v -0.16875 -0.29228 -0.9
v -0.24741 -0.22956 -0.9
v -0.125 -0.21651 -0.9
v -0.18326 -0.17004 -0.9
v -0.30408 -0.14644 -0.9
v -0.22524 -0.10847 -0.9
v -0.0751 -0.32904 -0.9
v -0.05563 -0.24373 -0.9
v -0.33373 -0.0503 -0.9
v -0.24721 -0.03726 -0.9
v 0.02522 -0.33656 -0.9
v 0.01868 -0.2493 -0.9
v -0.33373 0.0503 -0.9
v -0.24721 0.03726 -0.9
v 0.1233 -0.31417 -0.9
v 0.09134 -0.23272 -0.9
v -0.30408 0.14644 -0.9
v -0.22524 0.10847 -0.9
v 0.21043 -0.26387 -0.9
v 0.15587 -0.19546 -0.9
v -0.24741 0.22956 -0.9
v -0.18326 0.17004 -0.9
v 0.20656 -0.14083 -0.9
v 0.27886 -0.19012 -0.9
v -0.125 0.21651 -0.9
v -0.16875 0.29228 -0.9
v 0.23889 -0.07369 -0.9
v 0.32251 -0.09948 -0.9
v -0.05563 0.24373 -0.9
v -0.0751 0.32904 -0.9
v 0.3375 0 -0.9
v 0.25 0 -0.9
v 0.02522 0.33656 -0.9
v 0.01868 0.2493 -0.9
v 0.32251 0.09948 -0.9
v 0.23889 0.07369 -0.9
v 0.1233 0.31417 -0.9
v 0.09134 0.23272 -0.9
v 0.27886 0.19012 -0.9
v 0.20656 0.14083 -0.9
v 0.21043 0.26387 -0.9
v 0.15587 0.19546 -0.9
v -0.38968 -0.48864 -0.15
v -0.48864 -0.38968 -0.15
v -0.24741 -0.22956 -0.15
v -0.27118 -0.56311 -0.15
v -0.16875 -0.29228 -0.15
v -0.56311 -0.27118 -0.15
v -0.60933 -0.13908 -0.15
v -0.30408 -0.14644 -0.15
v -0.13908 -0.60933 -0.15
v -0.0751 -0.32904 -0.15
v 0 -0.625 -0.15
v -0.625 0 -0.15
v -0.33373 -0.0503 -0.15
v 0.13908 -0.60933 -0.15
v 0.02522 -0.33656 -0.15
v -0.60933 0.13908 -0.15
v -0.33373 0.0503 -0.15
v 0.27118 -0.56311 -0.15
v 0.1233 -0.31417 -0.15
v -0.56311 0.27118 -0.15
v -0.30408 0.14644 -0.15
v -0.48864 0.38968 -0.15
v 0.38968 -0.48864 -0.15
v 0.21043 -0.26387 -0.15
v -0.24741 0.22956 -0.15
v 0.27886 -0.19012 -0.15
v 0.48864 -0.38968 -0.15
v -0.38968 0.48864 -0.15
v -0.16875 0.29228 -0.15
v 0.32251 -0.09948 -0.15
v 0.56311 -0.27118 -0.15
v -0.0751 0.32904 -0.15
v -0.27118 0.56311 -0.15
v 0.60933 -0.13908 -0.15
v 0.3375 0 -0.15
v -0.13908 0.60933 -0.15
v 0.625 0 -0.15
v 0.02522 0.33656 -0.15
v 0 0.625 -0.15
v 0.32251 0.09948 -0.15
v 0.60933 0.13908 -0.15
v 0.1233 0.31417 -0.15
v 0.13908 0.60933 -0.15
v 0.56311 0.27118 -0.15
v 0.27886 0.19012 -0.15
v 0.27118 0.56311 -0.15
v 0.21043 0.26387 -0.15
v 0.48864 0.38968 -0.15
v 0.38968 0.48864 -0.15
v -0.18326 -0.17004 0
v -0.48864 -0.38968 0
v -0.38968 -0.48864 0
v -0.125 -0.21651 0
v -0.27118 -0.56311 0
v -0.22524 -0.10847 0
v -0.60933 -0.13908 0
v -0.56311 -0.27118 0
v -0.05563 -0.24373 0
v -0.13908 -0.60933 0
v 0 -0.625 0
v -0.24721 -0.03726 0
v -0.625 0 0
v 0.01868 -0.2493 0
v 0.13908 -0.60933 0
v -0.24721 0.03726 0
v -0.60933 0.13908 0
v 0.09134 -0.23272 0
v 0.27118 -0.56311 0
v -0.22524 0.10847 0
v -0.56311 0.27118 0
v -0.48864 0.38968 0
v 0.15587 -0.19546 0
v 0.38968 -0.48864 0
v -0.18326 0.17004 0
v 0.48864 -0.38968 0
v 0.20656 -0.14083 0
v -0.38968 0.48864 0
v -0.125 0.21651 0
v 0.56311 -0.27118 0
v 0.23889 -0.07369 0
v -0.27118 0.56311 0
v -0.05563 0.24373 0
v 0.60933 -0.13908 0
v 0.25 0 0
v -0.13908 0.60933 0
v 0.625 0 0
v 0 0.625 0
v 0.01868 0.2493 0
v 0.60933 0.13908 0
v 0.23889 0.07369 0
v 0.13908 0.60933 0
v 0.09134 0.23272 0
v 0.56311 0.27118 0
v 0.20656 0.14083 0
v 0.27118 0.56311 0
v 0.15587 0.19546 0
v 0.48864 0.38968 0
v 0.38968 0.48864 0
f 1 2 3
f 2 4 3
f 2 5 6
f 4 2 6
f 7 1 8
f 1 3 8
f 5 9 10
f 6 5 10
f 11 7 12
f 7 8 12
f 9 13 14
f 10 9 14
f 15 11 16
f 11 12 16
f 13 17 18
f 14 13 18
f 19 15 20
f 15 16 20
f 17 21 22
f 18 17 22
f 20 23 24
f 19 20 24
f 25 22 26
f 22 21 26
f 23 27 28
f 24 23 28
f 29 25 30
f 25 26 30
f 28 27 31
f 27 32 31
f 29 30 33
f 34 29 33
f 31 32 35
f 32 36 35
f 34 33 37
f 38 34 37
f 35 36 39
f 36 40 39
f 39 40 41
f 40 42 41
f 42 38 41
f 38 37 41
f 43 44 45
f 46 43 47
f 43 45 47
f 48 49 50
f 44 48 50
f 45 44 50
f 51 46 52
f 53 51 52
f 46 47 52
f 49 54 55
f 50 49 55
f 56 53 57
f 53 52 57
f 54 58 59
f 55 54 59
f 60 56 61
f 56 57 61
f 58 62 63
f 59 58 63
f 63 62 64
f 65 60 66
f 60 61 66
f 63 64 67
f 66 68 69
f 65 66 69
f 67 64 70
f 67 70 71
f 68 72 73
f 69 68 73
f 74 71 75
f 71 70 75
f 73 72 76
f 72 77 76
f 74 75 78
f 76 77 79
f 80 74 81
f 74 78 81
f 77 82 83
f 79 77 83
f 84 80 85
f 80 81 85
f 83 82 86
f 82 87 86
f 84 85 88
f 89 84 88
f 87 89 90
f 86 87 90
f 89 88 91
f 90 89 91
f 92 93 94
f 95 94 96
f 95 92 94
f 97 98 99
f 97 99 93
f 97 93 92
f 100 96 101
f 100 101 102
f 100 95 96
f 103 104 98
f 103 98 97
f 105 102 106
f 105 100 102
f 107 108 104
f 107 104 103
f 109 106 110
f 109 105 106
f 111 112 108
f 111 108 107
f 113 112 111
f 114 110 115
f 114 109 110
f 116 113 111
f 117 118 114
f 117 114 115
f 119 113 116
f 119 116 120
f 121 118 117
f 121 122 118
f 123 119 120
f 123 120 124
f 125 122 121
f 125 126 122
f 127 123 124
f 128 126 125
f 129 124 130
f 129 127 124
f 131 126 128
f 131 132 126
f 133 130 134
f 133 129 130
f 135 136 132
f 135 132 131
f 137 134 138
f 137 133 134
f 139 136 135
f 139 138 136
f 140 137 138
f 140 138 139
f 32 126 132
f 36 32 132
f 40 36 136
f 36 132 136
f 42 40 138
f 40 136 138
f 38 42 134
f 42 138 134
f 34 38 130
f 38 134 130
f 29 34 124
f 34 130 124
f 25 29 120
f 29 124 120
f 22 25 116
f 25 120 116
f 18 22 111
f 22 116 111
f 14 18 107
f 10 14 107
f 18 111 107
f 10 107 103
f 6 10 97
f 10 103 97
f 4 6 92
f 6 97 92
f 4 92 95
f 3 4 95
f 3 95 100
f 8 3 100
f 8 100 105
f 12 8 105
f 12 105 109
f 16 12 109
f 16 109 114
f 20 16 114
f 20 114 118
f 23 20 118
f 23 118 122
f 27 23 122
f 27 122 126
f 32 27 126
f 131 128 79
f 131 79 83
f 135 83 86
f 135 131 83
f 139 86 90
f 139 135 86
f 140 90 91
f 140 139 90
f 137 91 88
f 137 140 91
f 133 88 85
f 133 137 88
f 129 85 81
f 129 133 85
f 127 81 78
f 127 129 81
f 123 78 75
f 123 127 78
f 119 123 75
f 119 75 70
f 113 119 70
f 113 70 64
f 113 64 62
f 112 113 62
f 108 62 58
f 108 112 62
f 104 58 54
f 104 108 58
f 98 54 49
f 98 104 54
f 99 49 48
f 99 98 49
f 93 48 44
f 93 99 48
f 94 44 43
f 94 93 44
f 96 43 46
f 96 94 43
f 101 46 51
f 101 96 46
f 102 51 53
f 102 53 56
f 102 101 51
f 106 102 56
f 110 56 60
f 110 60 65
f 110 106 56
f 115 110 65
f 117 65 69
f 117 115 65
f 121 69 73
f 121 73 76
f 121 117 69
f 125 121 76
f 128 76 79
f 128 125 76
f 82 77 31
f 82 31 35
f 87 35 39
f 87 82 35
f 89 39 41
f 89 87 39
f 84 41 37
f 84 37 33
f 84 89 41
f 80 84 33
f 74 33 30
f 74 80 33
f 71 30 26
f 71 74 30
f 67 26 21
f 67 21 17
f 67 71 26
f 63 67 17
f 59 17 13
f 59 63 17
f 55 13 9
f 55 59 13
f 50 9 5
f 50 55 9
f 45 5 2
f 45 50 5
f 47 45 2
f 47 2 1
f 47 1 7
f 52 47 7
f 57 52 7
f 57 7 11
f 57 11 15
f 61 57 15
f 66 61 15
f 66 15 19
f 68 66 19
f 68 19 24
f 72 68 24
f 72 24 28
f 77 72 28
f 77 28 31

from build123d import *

# Parameters (mm, degrees)
SKETCH1_R           = 0.3375
BOSS_EXTRUDE1_DEPTH = 0.9
SKETCH2_R           = 0.625
BOSS_EXTRUDE2_DEPTH = 0.15
SKETCH3_R           = 0.25
CUT_EXTRUDE1_DEPTH  = 1.9


with BuildPart() as part:
    # Sketch1 → Boss-Extrude1 (new body)
    with BuildSketch(Plane.XY):
        Circle(SKETCH1_R)
    extrude(amount=-BOSS_EXTRUDE1_DEPTH)

    # Sketch2 → Boss-Extrude2 (add)
    with BuildSketch(Plane.XY):
        Circle(SKETCH2_R)
    extrude(amount=-BOSS_EXTRUDE2_DEPTH)

    # Sketch3 → Cut-Extrude1 (cut, through all)
    with BuildSketch(Plane.XY):
        Circle(SKETCH3_R)
    extrude(amount=-CUT_EXTRUDE1_DEPTH, mode=Mode.SUBTRACT)


solid = part.part
